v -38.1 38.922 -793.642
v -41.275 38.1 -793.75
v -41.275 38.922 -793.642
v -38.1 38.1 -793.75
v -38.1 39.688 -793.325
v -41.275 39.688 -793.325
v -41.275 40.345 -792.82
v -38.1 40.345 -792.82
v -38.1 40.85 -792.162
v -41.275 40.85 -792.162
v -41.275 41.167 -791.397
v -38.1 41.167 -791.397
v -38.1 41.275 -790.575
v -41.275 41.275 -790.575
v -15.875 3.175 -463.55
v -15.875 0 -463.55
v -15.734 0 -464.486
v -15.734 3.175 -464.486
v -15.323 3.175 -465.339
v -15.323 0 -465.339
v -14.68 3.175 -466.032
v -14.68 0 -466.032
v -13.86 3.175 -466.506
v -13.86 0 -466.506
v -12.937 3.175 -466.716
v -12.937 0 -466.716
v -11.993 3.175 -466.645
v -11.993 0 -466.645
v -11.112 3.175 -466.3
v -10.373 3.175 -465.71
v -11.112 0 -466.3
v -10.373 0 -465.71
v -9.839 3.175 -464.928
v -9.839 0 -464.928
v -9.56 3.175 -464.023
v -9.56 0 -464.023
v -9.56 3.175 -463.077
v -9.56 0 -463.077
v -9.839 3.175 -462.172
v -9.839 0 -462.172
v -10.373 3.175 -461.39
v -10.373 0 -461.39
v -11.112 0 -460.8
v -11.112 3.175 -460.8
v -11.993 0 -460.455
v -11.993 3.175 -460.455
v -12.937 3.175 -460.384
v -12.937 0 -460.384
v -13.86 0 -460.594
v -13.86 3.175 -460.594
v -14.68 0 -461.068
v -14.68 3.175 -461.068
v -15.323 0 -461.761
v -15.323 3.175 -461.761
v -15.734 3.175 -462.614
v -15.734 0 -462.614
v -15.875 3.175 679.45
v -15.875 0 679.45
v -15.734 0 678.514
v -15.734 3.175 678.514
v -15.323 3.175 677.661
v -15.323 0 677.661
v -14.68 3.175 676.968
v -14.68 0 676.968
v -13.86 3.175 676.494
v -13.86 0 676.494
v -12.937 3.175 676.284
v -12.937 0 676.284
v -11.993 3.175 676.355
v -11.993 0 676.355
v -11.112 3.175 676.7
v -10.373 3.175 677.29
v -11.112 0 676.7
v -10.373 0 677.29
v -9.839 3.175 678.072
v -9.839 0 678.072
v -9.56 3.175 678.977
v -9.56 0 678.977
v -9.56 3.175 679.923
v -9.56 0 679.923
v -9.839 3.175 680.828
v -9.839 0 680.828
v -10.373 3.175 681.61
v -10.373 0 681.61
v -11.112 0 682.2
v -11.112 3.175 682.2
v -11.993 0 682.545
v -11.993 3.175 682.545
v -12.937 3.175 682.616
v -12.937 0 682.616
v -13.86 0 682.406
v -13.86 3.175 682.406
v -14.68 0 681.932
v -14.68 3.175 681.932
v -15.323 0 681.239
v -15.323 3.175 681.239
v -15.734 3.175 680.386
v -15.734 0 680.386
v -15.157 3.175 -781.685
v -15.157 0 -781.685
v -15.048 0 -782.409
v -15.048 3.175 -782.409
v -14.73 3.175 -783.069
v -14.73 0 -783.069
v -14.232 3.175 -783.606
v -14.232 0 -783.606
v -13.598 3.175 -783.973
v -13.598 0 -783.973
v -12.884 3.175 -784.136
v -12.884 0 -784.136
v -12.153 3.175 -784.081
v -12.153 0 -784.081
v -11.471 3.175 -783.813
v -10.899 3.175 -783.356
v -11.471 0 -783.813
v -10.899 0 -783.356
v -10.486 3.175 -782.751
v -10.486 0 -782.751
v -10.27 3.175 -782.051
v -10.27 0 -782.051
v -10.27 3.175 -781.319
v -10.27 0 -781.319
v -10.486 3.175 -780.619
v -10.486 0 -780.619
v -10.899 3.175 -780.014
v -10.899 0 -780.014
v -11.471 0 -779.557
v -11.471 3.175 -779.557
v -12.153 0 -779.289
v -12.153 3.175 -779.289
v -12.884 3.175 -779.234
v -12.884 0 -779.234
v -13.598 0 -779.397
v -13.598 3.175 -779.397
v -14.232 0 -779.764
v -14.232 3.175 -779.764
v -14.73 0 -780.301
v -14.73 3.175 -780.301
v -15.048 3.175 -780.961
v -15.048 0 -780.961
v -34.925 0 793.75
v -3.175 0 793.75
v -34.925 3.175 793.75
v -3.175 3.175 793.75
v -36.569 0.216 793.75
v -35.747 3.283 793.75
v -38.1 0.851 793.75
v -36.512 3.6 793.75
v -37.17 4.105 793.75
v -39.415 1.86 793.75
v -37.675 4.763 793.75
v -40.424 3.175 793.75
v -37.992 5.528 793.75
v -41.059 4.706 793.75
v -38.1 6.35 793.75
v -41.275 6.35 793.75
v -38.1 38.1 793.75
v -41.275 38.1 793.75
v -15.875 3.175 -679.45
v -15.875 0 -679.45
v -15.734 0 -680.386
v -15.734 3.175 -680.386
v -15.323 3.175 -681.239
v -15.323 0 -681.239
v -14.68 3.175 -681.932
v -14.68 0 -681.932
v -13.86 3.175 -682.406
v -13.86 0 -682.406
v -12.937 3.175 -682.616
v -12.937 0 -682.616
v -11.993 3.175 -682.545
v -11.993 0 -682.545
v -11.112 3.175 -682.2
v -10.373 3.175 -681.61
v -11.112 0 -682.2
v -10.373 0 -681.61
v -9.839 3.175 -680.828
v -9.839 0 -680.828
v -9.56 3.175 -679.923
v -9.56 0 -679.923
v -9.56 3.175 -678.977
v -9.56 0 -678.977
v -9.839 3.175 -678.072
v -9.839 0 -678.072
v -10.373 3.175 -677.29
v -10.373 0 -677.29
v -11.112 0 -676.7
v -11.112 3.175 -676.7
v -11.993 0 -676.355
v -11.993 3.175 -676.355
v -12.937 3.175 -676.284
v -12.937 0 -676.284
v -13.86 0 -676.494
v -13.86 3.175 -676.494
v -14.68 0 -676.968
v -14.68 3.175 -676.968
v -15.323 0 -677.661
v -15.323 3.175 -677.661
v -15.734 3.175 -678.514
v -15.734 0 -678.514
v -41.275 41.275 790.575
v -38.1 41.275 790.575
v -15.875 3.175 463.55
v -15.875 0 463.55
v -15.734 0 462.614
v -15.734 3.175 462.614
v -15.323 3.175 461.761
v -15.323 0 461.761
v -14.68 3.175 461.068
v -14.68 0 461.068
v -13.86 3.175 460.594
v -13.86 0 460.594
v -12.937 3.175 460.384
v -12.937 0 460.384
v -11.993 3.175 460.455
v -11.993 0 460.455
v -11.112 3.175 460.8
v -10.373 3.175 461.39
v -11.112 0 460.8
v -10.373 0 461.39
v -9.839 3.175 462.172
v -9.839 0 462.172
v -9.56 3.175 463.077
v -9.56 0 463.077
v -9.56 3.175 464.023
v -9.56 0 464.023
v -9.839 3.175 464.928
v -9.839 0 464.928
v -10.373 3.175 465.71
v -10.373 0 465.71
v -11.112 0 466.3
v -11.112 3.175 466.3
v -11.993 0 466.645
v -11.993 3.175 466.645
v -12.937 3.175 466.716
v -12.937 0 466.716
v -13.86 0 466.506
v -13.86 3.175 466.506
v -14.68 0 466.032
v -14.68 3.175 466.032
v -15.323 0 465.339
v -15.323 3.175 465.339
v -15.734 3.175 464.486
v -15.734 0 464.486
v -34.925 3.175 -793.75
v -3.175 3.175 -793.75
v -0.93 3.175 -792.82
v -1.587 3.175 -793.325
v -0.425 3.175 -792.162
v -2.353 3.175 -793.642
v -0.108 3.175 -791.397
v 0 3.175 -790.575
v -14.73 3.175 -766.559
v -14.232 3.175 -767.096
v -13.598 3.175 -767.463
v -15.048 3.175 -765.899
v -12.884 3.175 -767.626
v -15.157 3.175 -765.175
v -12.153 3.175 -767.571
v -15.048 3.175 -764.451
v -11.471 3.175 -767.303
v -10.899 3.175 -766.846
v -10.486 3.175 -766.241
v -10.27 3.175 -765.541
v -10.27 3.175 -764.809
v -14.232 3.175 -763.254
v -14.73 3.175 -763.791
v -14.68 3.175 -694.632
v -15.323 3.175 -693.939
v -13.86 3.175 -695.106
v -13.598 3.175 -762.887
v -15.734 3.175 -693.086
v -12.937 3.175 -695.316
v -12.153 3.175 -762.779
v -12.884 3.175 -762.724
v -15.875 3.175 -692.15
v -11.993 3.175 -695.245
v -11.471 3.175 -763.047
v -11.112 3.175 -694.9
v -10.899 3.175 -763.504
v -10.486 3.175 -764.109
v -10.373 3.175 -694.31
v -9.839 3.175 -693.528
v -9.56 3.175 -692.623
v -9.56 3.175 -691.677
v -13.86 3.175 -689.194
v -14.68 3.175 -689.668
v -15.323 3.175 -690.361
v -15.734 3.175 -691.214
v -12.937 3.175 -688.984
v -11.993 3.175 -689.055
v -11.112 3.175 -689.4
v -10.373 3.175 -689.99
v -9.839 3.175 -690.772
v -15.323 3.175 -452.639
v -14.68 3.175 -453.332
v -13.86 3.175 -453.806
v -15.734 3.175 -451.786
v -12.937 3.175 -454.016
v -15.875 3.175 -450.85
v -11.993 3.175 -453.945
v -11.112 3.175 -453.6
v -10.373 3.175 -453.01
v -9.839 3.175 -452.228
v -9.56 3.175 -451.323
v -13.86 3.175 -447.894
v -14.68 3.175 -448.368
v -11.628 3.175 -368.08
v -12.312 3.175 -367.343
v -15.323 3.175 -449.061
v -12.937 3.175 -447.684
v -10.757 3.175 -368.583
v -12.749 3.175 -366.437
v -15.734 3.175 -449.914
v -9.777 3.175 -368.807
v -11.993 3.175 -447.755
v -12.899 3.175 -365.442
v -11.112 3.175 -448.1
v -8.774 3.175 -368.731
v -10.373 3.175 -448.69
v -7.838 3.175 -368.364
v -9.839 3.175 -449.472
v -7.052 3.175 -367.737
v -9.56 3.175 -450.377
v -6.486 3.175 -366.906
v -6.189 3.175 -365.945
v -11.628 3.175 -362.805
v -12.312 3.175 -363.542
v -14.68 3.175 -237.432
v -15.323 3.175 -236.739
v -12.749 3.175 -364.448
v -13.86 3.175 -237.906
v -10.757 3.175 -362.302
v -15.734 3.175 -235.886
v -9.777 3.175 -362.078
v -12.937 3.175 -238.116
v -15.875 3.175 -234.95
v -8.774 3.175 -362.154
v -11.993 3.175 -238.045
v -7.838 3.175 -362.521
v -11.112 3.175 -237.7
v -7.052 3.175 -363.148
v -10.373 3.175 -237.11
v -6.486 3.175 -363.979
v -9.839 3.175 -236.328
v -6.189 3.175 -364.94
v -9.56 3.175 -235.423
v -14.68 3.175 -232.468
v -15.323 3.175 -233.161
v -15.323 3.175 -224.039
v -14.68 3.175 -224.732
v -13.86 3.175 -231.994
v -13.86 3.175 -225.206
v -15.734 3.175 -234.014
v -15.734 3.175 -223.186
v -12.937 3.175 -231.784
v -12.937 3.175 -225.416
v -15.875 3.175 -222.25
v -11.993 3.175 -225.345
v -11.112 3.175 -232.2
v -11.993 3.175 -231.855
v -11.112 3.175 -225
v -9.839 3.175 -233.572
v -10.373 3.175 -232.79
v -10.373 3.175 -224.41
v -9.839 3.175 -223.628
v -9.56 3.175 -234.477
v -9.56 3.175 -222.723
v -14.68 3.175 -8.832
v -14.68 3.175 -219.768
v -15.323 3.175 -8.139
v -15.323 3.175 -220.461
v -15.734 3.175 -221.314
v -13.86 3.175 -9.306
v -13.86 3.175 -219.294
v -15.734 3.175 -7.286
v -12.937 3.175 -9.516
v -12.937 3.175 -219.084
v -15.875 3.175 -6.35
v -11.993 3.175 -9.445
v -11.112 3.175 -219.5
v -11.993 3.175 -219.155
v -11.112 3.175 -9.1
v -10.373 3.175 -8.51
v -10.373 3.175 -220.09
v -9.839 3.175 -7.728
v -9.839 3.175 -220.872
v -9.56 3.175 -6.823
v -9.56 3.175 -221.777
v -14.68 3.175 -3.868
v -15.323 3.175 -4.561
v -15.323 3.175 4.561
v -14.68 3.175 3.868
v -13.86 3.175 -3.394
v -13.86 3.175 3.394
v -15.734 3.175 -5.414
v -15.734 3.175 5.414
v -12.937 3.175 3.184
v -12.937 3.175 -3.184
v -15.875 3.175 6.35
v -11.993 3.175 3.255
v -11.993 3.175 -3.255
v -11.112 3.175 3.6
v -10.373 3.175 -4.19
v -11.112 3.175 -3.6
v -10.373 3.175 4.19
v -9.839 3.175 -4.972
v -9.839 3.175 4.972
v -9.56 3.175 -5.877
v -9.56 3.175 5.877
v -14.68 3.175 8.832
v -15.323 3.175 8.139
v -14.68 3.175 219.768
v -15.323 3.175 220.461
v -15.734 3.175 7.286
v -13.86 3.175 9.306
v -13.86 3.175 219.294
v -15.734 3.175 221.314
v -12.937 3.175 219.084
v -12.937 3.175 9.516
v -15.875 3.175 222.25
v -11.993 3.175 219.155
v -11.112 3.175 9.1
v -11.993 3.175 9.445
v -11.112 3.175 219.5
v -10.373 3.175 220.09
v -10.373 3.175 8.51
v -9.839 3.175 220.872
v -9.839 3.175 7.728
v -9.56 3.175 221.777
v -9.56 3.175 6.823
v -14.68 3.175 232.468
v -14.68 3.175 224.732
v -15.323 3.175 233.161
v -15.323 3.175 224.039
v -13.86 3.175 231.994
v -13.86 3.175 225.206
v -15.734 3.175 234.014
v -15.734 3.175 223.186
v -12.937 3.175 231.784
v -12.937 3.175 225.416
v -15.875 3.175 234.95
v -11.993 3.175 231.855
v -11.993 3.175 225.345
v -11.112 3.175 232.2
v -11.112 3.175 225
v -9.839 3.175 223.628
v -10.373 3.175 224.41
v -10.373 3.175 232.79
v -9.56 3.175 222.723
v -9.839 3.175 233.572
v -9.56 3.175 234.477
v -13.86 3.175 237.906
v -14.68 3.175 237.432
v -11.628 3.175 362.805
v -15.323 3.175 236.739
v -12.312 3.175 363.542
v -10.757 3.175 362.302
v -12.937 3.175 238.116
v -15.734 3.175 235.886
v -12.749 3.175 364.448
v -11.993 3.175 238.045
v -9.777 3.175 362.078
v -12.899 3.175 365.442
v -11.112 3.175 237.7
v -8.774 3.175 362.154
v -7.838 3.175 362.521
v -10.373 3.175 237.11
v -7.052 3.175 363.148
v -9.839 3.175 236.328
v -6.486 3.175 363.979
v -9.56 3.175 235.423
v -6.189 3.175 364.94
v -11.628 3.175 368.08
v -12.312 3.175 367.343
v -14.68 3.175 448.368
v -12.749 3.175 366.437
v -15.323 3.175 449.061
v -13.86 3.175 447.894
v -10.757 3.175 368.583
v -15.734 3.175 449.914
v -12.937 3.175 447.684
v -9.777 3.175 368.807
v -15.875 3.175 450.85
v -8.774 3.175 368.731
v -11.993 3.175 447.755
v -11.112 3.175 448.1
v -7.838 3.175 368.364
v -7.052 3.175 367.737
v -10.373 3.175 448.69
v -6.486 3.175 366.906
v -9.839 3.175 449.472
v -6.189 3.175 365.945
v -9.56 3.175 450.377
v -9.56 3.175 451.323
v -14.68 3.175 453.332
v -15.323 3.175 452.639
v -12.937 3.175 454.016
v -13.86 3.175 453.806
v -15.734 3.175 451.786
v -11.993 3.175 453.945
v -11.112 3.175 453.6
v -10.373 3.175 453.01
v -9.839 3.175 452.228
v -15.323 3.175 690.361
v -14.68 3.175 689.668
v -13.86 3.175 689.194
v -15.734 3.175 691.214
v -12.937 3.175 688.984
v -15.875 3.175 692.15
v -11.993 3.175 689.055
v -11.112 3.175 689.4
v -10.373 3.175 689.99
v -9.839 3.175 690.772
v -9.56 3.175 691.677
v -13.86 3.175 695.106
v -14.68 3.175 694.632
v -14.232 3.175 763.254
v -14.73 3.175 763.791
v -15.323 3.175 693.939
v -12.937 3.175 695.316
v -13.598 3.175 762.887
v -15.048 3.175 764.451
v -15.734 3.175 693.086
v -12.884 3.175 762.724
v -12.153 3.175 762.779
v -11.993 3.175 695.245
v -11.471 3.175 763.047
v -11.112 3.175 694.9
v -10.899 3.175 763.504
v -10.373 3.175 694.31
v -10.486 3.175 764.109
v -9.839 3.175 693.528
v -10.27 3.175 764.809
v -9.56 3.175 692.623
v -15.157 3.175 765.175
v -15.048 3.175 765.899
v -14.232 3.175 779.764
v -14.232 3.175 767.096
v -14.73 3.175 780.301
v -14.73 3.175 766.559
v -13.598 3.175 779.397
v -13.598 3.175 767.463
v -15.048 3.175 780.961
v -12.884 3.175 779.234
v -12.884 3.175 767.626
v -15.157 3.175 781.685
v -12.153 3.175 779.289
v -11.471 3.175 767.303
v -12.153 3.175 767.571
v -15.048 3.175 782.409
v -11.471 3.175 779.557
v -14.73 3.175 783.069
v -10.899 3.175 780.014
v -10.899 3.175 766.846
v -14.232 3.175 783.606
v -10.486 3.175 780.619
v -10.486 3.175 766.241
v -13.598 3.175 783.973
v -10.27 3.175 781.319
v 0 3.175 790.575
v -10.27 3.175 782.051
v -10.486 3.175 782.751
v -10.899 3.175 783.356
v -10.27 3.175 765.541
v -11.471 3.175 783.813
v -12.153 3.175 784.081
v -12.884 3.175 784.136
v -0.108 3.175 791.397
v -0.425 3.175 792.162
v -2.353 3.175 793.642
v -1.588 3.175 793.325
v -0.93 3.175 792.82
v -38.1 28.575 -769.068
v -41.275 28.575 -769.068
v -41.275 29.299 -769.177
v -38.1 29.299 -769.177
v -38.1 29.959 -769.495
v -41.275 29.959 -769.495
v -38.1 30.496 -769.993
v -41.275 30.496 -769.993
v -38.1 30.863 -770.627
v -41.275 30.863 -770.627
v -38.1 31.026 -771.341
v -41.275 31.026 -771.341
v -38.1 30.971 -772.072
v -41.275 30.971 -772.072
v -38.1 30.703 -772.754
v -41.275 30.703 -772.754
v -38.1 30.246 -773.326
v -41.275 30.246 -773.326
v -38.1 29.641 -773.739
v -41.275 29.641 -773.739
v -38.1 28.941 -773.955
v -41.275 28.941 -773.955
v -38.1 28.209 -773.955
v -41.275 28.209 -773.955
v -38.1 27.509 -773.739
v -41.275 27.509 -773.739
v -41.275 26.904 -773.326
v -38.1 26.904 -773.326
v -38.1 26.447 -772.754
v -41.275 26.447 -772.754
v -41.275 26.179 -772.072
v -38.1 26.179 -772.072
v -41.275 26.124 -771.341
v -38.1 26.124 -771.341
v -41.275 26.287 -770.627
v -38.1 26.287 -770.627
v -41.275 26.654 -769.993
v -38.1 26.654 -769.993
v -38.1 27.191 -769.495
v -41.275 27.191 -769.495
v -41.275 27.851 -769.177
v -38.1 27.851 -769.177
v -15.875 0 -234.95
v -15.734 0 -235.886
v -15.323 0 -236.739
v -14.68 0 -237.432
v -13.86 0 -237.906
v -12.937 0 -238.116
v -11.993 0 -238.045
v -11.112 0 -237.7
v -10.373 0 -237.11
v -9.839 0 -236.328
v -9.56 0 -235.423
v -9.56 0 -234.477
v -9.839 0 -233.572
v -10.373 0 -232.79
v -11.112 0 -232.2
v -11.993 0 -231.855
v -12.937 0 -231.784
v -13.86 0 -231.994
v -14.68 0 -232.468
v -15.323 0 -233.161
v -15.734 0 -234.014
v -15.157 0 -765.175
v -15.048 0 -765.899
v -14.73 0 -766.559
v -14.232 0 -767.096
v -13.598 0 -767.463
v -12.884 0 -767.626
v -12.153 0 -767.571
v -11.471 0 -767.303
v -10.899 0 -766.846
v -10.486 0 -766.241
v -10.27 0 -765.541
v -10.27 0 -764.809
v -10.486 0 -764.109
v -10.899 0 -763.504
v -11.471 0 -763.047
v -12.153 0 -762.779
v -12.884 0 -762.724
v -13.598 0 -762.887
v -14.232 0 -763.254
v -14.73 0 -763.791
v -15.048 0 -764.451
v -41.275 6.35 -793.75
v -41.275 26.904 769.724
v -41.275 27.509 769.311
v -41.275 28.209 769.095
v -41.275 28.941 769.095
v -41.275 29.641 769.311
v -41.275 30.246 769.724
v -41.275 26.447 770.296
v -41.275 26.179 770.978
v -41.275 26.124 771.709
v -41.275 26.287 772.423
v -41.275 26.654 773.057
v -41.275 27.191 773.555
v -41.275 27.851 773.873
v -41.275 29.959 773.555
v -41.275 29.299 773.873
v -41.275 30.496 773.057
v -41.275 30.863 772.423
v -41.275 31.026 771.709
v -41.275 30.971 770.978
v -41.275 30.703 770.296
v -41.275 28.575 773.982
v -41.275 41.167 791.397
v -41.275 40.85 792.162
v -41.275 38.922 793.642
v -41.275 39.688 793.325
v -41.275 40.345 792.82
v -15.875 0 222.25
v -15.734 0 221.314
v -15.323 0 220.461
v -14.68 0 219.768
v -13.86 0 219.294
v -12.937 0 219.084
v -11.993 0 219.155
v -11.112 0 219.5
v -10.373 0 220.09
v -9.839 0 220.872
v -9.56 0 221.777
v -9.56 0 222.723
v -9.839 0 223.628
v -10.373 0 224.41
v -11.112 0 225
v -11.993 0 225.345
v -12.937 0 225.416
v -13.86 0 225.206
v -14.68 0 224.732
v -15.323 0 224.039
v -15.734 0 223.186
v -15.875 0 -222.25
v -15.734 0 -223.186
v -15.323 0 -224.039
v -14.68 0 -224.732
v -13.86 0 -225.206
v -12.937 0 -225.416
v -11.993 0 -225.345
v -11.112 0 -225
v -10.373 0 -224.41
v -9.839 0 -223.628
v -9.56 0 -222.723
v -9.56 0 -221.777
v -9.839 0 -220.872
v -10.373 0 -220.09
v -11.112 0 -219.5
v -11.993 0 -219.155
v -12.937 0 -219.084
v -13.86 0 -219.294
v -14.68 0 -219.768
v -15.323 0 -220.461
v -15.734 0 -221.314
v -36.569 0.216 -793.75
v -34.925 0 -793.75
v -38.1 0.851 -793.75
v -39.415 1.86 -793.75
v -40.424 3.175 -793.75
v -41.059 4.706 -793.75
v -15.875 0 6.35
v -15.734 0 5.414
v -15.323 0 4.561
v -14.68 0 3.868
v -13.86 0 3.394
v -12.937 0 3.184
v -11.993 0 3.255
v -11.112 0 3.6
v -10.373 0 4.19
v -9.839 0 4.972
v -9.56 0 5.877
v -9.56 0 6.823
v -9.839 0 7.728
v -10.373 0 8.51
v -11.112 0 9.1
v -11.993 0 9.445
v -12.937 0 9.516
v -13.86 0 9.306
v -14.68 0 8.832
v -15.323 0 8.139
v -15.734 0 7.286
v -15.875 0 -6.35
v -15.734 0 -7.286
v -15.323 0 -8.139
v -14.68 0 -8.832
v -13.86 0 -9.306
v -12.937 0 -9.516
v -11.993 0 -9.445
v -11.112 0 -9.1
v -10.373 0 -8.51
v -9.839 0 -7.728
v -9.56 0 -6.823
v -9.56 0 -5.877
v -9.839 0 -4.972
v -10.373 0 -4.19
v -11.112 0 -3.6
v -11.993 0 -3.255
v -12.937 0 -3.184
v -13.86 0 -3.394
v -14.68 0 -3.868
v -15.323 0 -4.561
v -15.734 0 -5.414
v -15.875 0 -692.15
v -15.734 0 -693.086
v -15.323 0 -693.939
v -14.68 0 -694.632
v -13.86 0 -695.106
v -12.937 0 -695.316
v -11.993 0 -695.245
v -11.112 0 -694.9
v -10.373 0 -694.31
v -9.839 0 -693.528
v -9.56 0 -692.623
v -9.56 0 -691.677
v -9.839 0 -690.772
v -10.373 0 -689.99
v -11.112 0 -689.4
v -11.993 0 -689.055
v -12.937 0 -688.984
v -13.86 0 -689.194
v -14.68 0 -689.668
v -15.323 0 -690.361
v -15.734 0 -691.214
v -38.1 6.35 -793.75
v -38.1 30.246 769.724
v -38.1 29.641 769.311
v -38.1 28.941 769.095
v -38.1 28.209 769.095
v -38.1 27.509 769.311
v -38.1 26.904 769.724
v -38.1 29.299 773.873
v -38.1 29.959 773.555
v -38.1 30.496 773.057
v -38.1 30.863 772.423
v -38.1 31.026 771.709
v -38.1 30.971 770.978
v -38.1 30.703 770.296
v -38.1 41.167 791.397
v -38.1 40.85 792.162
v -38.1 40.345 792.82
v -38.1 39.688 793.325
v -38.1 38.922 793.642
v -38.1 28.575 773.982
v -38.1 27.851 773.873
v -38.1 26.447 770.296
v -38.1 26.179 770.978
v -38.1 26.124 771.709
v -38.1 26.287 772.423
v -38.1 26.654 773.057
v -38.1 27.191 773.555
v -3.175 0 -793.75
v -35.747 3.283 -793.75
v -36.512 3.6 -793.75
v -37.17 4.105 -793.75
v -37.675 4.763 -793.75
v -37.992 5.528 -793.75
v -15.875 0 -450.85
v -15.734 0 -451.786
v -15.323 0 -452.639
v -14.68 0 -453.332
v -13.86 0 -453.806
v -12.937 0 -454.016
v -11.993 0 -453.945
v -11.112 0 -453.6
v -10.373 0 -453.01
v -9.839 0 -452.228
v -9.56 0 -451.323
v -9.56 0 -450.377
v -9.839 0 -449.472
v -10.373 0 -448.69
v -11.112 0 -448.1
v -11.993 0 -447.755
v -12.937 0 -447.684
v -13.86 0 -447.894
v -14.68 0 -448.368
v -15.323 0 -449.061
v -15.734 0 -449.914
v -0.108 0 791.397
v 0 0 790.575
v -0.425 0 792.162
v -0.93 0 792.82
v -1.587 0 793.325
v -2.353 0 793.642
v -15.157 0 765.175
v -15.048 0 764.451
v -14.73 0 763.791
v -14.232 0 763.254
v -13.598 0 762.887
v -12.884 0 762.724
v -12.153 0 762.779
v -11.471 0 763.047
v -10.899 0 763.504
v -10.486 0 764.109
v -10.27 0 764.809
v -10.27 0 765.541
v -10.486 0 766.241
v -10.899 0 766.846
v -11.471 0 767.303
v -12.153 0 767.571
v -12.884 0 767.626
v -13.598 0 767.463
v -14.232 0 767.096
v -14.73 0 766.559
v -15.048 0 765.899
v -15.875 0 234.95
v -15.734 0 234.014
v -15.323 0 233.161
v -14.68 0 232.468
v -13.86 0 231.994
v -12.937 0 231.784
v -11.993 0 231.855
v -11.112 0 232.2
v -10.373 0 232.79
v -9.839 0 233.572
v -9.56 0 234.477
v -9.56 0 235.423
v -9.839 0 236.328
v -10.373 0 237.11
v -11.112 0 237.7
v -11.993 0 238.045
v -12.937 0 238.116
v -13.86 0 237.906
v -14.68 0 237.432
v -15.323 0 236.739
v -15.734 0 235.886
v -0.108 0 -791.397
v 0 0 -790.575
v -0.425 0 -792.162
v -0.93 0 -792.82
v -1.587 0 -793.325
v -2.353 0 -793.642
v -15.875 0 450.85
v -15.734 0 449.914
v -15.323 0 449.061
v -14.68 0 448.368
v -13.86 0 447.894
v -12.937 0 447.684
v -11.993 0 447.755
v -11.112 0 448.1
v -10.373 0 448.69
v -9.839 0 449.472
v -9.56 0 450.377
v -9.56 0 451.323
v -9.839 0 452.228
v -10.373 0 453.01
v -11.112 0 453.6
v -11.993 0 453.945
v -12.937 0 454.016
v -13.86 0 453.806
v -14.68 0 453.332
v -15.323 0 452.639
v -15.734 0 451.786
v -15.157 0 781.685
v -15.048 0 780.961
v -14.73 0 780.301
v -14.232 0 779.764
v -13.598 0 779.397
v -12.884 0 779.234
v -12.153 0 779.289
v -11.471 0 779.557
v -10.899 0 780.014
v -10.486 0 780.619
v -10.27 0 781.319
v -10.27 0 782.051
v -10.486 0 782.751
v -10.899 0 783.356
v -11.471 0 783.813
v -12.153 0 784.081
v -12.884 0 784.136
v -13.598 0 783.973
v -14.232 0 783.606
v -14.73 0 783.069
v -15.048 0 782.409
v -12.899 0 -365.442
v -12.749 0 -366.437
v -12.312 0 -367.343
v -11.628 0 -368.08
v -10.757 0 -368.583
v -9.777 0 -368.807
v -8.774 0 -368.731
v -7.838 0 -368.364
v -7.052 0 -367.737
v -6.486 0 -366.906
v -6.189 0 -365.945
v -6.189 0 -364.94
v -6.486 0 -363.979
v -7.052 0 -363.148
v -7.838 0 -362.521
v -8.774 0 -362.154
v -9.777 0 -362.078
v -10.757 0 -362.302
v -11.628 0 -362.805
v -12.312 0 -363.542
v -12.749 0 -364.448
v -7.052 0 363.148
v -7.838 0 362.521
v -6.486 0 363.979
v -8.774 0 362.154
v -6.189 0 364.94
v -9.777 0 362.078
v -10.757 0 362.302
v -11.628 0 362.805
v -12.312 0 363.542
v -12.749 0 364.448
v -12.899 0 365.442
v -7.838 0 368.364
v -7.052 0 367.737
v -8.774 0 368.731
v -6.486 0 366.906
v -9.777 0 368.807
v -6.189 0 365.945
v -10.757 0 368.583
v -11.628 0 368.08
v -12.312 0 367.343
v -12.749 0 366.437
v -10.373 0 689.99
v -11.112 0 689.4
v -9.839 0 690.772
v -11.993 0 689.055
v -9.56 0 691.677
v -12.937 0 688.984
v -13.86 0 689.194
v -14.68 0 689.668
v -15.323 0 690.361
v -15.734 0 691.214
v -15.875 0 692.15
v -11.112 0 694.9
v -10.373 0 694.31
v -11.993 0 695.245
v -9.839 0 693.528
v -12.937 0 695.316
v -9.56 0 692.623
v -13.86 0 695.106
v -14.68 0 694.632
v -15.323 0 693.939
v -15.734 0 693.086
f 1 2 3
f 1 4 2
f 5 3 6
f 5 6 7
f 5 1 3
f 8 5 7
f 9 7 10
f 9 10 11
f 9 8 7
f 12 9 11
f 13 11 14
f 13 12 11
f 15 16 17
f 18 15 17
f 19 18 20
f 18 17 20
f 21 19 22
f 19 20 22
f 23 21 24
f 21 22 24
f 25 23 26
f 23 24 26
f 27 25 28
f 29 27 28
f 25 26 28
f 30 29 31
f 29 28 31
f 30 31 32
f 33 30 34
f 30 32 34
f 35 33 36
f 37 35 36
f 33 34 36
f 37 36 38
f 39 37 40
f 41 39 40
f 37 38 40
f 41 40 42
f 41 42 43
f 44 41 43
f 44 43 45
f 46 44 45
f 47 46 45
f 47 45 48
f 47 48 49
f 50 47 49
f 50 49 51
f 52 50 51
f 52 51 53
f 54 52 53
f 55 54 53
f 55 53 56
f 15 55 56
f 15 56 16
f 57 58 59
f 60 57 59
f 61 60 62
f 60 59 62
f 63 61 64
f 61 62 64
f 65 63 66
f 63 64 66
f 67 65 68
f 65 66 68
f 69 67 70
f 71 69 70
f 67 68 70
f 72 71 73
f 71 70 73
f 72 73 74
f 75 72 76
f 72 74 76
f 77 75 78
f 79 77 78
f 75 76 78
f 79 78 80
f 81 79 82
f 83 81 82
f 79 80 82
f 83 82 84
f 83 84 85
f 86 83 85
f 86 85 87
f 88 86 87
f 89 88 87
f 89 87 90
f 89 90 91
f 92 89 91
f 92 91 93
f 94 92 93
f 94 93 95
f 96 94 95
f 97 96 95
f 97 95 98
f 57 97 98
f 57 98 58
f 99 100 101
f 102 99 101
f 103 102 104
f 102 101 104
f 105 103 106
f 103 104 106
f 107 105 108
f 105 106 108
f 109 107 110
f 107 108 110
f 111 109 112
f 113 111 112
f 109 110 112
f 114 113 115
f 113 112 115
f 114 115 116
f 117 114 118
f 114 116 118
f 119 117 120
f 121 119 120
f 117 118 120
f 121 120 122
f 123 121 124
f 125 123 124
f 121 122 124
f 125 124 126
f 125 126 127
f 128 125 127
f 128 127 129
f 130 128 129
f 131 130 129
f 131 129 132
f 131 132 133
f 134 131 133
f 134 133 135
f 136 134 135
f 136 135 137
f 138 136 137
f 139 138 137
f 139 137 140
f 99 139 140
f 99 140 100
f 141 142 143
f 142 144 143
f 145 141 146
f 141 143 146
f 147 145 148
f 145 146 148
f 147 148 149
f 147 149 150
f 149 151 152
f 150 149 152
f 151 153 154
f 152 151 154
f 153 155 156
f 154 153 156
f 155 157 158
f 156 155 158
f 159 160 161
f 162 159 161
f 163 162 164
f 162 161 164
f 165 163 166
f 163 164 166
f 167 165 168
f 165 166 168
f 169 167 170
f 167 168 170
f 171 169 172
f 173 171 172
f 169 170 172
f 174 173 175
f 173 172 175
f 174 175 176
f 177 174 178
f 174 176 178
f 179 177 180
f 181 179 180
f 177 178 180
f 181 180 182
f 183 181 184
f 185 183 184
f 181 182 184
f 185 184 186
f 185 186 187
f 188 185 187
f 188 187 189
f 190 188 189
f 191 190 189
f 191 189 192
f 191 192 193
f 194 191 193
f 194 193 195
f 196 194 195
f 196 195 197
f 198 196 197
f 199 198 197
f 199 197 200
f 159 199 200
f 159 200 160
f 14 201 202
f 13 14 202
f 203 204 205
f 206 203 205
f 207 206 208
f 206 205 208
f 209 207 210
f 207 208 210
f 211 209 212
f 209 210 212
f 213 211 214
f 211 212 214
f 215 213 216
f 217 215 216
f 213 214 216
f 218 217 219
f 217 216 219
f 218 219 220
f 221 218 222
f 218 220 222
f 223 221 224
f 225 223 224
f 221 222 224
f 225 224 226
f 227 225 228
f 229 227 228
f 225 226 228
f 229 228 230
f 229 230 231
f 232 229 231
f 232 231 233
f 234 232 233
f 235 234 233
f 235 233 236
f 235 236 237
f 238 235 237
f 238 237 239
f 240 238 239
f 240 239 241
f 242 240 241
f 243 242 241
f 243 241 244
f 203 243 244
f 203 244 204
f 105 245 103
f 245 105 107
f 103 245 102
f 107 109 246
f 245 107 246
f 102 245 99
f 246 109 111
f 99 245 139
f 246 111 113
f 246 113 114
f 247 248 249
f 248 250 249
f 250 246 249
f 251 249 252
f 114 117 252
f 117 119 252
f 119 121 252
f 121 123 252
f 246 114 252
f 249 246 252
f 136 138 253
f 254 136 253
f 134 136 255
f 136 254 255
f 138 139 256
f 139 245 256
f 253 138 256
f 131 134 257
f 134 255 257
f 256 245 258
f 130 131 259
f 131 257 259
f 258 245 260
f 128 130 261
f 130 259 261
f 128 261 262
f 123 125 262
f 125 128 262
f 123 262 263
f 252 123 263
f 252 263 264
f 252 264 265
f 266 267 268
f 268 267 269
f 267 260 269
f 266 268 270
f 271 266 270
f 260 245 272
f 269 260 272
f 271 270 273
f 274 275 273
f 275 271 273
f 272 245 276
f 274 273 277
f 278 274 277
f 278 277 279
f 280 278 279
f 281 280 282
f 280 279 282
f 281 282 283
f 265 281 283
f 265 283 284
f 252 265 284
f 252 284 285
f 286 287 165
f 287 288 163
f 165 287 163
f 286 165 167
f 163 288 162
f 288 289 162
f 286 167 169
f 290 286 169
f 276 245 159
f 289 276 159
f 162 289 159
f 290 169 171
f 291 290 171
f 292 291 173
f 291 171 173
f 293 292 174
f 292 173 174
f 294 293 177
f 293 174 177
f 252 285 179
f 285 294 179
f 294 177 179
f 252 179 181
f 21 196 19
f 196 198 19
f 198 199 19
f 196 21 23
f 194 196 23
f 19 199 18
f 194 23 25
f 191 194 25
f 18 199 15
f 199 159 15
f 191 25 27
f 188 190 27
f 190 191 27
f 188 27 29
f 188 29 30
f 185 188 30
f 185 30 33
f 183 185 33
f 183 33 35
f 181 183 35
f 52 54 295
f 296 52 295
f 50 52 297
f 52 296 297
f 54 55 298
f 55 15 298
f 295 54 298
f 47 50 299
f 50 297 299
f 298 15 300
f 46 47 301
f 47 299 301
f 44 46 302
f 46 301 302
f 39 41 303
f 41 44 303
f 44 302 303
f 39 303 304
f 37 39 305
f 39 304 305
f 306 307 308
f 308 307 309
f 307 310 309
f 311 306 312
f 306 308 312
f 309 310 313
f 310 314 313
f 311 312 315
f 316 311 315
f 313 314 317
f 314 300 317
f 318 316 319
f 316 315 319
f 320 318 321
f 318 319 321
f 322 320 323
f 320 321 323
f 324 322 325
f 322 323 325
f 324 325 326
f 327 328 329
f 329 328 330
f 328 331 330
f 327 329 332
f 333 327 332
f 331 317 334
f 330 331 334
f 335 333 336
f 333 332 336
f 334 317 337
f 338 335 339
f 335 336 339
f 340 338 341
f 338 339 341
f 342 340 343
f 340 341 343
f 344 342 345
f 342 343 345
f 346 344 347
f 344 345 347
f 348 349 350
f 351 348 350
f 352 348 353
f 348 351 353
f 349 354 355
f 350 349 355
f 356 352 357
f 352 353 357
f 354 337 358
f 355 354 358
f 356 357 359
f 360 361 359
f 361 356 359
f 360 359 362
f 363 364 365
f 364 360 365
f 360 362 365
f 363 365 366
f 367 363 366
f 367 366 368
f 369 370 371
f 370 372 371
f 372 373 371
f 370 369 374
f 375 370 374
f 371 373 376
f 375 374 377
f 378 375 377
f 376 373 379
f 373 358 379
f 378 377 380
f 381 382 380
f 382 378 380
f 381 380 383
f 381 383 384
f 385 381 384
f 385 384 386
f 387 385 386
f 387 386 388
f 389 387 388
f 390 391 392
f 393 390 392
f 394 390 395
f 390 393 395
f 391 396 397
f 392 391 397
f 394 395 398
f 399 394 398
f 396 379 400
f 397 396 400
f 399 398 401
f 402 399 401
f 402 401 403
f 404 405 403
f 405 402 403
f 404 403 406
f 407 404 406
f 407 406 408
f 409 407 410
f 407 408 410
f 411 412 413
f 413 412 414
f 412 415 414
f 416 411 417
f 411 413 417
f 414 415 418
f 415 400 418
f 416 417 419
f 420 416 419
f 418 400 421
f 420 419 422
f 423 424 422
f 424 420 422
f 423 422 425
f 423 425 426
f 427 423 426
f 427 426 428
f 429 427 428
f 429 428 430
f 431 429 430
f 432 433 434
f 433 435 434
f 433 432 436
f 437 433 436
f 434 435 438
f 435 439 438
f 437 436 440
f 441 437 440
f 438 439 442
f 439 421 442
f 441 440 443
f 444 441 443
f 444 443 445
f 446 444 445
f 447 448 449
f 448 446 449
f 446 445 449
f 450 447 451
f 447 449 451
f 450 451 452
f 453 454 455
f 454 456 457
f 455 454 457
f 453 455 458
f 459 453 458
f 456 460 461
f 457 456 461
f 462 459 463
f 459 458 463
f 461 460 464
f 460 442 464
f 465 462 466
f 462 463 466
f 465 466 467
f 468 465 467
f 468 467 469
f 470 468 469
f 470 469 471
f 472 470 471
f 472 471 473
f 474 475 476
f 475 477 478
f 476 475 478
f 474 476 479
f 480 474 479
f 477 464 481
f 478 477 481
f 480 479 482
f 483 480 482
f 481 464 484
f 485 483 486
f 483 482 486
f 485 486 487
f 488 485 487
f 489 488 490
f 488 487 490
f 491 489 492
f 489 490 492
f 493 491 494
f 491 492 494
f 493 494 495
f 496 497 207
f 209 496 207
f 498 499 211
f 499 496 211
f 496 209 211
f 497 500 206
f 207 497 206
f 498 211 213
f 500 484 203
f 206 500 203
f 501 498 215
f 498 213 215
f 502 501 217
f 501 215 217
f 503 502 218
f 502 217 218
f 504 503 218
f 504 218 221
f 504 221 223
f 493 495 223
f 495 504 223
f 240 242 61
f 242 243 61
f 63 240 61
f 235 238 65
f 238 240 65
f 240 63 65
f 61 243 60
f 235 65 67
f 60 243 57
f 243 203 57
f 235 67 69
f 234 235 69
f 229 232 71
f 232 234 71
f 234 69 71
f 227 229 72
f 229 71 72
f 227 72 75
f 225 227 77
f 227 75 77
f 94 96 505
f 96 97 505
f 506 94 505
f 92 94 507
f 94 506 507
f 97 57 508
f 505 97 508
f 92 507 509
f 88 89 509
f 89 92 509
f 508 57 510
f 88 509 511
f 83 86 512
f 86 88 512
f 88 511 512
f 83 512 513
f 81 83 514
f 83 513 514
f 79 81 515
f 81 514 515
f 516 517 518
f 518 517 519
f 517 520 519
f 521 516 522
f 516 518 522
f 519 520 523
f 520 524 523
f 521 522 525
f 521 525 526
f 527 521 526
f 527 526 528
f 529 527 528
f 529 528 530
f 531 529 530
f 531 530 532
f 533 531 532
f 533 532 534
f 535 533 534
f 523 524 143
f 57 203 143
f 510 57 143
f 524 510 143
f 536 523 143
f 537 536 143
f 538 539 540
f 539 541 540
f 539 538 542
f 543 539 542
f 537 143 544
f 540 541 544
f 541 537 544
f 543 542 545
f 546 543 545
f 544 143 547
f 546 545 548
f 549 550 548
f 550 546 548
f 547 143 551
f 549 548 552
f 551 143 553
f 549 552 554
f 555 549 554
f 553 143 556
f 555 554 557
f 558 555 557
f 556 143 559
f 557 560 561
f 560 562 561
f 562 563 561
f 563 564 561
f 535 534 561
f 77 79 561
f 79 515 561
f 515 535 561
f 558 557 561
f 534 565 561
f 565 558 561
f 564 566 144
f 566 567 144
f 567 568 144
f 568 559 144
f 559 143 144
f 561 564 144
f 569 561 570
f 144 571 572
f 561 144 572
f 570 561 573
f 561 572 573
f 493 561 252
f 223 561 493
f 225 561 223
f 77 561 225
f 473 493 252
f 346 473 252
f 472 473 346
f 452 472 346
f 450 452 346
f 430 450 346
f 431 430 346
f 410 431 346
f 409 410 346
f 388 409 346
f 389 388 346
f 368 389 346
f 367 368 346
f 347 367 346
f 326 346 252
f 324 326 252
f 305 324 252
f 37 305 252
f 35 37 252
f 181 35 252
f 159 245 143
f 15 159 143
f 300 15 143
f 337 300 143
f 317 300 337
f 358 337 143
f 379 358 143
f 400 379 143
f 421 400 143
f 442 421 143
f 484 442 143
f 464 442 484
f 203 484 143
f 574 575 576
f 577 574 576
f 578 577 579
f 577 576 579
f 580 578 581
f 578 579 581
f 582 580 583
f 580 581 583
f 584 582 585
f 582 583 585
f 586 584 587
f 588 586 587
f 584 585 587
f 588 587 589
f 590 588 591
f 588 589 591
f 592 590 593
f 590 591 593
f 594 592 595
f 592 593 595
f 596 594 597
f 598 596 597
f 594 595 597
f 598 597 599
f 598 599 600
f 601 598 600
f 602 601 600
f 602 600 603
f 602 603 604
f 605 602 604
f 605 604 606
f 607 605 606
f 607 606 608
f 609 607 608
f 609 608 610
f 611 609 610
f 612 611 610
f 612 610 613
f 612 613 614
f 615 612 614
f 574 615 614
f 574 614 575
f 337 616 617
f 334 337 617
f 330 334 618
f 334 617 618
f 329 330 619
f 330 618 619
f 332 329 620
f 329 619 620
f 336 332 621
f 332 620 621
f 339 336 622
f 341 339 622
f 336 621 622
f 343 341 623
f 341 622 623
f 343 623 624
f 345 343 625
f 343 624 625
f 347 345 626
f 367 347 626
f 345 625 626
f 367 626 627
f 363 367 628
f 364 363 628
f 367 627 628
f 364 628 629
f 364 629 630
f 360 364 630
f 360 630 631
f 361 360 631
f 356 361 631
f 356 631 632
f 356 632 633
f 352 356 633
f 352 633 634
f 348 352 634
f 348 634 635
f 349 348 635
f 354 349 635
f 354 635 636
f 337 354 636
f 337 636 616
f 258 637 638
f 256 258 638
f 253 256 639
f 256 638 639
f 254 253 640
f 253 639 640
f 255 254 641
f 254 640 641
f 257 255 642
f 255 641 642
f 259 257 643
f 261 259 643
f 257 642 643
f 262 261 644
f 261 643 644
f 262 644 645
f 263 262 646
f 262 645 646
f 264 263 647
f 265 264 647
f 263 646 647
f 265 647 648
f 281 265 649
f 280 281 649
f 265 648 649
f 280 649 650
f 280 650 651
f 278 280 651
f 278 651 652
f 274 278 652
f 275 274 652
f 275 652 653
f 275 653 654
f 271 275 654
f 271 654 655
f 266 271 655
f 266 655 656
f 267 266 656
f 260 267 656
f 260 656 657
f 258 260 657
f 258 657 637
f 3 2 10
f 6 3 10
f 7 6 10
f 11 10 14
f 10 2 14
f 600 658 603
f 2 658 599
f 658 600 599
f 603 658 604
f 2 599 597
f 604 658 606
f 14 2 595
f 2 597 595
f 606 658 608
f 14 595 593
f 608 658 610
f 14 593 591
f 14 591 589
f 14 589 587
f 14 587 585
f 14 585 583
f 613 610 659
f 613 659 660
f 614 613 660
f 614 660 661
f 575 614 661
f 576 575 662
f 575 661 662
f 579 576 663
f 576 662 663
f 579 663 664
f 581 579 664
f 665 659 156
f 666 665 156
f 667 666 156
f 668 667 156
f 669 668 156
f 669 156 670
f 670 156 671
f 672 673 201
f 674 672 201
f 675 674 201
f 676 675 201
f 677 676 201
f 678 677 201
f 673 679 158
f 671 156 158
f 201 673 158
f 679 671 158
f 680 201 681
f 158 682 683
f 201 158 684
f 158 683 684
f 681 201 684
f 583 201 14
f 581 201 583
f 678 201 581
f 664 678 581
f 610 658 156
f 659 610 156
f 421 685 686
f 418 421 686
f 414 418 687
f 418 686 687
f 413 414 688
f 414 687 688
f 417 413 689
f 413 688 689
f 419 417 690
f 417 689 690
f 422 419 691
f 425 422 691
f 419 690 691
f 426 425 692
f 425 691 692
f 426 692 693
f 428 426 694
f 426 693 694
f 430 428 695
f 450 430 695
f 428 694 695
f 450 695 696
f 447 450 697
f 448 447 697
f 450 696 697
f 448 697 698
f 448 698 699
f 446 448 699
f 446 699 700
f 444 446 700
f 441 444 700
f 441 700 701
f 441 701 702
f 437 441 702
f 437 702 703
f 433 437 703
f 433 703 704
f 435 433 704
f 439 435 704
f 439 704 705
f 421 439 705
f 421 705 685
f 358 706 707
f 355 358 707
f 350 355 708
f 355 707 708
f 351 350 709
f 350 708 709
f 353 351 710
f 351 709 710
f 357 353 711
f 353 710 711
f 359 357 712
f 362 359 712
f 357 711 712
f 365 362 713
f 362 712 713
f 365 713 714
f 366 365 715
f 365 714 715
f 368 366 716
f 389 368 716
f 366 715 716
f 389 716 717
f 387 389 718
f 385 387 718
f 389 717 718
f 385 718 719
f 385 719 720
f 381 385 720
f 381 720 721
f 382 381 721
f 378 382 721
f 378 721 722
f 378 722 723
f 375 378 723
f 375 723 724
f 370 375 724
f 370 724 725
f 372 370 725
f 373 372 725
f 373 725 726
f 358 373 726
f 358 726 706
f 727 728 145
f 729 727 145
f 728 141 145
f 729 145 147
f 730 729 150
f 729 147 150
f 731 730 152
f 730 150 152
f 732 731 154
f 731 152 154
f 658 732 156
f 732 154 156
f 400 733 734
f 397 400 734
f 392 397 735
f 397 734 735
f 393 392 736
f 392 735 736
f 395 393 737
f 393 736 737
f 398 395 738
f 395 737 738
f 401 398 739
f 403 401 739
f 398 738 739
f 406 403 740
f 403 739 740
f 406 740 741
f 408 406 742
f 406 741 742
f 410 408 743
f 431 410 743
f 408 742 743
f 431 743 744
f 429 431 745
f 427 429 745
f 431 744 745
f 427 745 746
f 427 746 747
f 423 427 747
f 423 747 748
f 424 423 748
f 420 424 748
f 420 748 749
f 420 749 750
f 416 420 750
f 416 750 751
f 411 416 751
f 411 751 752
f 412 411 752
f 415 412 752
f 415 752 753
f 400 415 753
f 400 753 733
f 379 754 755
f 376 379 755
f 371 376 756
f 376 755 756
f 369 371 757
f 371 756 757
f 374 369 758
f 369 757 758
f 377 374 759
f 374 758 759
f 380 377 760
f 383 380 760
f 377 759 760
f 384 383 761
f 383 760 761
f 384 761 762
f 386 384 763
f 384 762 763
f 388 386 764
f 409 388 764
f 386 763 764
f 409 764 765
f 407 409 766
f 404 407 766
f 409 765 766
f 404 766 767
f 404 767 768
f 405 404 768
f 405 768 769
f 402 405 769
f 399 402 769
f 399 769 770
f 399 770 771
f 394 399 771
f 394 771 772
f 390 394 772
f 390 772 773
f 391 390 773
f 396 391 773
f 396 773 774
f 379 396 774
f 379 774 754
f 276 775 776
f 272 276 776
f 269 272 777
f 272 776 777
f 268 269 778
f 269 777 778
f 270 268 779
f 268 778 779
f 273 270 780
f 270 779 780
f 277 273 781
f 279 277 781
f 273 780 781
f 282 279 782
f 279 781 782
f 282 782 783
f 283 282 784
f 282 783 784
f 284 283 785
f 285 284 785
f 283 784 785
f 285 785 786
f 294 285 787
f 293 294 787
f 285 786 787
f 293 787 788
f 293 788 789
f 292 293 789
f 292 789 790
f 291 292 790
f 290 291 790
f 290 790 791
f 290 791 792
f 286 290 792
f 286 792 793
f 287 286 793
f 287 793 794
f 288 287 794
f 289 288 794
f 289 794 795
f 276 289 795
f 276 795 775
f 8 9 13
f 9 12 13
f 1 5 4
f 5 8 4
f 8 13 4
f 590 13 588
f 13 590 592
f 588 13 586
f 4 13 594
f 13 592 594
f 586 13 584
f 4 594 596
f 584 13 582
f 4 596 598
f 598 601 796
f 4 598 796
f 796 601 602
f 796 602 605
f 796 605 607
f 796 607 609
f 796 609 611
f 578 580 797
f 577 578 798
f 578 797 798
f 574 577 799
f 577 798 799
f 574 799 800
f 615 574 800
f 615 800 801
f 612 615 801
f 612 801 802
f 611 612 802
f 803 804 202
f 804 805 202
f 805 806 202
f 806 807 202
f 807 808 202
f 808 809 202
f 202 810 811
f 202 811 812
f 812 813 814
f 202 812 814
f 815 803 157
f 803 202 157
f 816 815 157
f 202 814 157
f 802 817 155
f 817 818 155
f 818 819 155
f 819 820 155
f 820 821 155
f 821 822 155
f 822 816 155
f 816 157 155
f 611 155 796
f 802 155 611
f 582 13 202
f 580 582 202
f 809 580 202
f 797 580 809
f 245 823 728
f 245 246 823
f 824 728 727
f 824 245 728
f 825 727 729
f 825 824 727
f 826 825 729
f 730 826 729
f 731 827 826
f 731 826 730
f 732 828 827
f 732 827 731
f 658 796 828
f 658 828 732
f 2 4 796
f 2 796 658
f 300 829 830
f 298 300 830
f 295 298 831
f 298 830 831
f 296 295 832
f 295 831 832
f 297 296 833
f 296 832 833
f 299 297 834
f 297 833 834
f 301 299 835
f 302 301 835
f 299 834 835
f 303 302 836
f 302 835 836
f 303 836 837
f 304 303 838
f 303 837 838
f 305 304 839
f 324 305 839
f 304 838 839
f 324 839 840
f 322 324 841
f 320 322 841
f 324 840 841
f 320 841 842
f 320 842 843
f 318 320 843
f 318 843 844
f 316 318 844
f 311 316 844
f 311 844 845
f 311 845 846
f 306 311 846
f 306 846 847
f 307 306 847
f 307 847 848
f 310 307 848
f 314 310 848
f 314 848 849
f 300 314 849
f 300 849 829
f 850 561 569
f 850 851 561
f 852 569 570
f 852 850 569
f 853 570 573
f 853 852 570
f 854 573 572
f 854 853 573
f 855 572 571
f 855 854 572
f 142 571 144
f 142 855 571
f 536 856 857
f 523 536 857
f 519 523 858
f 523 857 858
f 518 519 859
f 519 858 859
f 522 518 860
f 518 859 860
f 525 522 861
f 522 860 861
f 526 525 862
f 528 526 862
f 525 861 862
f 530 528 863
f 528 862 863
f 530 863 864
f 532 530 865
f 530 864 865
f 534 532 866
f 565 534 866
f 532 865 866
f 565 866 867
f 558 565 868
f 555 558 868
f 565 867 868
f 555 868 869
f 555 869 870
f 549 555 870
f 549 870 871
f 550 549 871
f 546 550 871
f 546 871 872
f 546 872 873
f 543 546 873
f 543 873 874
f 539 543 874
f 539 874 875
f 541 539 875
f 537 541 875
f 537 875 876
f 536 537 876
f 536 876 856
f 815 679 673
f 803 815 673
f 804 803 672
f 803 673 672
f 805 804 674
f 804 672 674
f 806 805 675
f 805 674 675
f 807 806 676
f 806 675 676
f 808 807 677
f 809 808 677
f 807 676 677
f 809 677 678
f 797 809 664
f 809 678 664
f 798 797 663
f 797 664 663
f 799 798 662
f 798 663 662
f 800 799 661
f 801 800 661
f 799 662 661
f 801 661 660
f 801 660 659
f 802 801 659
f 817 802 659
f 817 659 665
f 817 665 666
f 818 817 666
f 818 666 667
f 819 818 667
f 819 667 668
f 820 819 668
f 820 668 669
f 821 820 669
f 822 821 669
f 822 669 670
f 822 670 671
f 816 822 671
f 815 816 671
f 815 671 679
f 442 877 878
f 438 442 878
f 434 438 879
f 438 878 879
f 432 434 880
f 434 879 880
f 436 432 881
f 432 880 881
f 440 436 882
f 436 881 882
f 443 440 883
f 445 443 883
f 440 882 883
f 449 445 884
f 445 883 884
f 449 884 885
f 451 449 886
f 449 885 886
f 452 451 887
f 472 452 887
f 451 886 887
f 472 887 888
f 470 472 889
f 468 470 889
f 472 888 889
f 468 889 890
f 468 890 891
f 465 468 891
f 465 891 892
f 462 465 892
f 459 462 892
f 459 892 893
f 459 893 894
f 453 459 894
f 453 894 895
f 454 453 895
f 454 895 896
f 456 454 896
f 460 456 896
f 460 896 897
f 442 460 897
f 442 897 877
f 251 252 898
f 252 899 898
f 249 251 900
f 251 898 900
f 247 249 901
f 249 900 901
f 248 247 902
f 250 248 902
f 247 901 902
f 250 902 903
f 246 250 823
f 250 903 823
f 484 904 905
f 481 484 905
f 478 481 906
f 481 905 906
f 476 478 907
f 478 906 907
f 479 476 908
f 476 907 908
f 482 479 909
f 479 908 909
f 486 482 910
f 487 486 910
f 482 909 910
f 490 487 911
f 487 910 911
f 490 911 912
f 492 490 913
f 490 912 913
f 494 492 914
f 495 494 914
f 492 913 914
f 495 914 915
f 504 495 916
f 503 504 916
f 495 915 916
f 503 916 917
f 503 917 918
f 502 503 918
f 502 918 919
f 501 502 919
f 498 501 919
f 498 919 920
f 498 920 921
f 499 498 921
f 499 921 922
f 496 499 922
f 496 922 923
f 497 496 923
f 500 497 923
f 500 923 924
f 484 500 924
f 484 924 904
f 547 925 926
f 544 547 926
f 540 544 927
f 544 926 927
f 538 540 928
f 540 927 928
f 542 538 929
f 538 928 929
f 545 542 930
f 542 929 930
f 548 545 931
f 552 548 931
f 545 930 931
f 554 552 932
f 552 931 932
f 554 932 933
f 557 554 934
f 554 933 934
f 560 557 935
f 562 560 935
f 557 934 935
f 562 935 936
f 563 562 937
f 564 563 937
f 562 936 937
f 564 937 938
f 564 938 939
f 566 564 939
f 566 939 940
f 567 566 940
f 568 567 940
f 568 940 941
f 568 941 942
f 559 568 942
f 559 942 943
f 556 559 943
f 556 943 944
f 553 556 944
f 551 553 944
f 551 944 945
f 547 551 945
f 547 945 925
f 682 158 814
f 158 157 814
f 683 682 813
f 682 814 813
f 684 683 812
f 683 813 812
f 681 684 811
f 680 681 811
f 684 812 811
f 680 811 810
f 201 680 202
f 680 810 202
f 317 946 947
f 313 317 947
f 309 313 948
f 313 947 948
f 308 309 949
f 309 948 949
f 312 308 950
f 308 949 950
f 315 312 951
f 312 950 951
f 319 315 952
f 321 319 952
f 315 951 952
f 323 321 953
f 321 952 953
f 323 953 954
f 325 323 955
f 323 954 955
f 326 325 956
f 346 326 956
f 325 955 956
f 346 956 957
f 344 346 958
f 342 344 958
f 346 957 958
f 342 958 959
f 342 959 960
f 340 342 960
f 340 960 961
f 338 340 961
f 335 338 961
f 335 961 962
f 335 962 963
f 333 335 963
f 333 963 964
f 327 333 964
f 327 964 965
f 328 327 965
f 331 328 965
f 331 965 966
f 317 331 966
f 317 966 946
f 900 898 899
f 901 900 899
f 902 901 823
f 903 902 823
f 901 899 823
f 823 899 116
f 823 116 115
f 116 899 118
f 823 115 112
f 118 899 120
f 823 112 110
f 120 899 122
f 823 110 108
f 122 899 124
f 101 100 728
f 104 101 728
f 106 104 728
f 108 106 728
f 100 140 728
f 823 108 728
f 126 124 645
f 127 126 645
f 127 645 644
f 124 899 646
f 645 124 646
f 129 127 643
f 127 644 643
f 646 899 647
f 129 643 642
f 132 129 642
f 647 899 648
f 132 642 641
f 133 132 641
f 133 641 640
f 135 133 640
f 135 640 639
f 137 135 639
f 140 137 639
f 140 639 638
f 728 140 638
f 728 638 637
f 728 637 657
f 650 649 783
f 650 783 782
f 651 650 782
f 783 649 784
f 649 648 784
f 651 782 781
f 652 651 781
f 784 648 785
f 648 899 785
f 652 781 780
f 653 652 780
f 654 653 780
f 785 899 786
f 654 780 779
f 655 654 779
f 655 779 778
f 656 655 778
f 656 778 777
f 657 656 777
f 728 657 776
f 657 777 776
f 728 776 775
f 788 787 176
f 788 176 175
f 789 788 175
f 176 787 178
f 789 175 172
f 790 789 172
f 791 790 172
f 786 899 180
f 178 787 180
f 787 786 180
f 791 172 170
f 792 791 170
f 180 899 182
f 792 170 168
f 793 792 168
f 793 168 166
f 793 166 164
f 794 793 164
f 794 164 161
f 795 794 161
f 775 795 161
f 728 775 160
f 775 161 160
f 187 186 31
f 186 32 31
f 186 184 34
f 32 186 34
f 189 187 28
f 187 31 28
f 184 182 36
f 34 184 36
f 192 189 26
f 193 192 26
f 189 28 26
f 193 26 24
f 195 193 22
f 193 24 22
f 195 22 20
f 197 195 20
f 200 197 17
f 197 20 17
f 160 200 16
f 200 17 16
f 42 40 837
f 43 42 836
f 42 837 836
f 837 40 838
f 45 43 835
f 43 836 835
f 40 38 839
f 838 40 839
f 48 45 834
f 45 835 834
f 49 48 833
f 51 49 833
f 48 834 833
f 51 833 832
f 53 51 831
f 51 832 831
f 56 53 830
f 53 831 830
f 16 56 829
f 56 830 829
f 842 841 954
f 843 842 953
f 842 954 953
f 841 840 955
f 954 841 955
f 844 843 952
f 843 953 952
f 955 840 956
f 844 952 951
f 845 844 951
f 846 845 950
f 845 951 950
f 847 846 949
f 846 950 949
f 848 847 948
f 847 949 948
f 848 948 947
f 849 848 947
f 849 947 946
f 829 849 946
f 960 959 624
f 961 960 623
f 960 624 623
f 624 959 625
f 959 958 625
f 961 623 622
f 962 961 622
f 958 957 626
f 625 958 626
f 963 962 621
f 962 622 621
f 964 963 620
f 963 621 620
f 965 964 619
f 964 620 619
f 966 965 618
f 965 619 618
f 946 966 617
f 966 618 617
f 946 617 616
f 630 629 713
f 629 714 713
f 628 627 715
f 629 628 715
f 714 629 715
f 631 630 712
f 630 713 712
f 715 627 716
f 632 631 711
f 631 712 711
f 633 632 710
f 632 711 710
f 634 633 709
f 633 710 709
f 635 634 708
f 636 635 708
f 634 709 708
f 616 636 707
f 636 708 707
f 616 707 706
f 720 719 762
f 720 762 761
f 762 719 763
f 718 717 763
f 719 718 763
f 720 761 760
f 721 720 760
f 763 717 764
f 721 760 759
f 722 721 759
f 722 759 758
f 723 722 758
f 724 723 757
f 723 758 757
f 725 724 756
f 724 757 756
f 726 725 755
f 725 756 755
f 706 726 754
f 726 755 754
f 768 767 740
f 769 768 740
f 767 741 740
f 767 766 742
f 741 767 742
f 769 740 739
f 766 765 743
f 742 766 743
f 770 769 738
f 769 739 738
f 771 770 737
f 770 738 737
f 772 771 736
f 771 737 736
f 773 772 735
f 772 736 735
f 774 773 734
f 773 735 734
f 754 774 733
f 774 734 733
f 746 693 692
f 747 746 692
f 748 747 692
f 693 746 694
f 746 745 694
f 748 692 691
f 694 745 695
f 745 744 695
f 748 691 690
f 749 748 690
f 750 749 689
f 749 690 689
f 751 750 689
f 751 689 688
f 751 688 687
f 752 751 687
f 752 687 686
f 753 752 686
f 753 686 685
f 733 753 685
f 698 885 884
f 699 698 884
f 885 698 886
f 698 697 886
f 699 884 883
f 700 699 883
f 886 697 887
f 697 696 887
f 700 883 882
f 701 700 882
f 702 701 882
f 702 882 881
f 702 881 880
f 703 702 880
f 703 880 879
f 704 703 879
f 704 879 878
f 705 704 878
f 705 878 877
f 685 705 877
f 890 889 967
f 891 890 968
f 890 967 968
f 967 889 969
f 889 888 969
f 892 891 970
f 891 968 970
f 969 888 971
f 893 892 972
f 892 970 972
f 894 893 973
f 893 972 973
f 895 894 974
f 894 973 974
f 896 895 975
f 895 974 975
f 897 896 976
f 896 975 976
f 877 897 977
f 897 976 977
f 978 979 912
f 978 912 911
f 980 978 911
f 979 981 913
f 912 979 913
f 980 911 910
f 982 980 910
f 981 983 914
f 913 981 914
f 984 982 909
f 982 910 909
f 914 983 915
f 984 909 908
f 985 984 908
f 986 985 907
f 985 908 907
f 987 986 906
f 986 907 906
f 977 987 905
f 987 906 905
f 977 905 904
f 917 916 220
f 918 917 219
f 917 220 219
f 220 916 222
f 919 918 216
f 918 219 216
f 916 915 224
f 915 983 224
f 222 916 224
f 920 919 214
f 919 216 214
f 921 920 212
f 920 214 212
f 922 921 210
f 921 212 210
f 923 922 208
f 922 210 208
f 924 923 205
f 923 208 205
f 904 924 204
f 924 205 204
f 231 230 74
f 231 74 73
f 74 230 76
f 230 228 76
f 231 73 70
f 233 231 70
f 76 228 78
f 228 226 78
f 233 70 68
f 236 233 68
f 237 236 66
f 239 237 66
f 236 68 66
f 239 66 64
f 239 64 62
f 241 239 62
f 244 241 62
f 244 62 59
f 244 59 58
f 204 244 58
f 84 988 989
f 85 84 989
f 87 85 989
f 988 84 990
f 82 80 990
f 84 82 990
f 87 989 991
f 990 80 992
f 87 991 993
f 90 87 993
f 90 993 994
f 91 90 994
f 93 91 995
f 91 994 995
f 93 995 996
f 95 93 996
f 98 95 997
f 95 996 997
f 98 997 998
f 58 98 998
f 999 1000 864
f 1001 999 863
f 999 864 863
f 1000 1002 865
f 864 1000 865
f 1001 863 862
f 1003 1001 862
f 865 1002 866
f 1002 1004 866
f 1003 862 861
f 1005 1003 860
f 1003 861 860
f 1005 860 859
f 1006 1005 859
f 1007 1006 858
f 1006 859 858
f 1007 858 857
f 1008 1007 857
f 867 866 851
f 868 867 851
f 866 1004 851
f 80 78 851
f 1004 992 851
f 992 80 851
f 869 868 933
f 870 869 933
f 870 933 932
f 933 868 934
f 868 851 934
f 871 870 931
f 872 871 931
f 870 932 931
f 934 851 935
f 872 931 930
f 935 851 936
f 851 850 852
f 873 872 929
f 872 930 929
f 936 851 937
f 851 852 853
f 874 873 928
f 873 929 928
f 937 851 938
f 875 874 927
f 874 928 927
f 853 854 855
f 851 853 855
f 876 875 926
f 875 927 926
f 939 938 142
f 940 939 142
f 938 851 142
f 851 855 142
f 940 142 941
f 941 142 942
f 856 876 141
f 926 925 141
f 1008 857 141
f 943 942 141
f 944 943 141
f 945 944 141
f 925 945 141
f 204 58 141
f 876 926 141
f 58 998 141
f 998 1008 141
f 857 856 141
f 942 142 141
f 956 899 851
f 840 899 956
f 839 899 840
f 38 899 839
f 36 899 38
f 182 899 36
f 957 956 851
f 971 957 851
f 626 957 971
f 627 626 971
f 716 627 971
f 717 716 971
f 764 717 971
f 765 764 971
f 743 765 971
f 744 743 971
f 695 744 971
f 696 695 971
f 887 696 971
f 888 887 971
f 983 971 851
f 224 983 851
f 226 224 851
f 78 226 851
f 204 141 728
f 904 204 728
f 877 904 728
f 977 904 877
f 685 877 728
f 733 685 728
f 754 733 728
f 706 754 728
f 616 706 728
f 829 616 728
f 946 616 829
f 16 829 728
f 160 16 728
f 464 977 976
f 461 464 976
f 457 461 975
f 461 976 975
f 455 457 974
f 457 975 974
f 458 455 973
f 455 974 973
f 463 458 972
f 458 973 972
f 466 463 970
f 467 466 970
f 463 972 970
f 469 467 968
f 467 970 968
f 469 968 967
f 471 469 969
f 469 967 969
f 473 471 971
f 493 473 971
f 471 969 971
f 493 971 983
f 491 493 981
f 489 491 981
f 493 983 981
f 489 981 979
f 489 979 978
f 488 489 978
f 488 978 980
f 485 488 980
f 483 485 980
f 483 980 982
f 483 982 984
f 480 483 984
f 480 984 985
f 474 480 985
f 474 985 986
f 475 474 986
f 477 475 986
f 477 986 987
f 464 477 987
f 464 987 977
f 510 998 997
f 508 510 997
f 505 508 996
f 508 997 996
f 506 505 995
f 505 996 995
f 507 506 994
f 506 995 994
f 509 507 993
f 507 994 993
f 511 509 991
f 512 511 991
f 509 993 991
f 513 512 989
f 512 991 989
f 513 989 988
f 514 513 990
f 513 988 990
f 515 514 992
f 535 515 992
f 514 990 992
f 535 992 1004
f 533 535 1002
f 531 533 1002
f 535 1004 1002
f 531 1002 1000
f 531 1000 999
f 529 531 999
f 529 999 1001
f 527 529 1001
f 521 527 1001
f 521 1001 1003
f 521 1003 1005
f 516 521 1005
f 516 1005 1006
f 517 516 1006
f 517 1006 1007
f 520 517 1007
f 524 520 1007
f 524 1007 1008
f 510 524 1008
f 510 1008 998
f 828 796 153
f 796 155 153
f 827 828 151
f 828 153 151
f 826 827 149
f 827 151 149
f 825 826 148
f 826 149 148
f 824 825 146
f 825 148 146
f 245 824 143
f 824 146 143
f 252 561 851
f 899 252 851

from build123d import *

# Parameters (mm, degrees)
BASE_FLANGE1_DEPTH               = 793.75
E_0_25_DIAMETER_HOLE1_D          = 6.35
F_10_0_1935_DIAMETER_HOLE1_D     = 4.9149
FILLET1_R                        = 3.175
F_17_64_0_26563_DIAMETER_HOLE2_D = 6.747002
F_10_0_1935_DIAMETER_HOLE2_D     = 4.9149


# Sheet-metal steps are written as plain solids
with BuildPart() as part:
    # Sketch1 → Base-Flange1 (new, symmetric)
    with BuildSketch(Plane.XY):
        with BuildLine():
            Line((0, 0), (-34.925, 0))
            ThreePointArc((-34.925, 0), (-39.415128061, 1.859871939), (-41.275, 6.35))
            Line((-41.275, 6.35), (-41.275, 41.275))
            Line((-41.275, 41.275), (-38.1, 41.275))
            Line((-38.1, 41.275), (-38.1, 6.35))
            ThreePointArc((-38.1, 6.35), (-37.17006403, 4.10493597), (-34.925, 3.175))
            Line((-34.925, 3.175), (0, 3.175))
            Line((0, 3.175), (0, 0))
        make_face()
    extrude(amount=BASE_FLANGE1_DEPTH, both=True)

    # E (0.25) Diameter Hole1 (through all)
    with Locations(Plane(origin=(0, 3.175, 0), x_dir=(1, 0, 0), z_dir=(0, 1, 0))):
        with Locations((-12.7, 6.35), (-12.7, -6.35), (-12.7, 234.95), (-12.7, 222.25), (-12.7, 463.55), (-12.7, 450.85), (-12.7, 692.15), (-12.7, 679.45), (-12.7, -222.25), (-12.7, -234.95), (-12.7, -450.85), (-12.7, -463.55), (-12.7, -679.45), (-12.7, -692.15)):
            Hole(E_0_25_DIAMETER_HOLE1_D / 2)

    # #10 (0.1935) Diameter Hole1 (through all)
    with Locations(Plane(origin=(0, 3.175, 0), x_dir=(1, 0, 0), z_dir=(0, 1, 0))):
        with Locations((-12.7, -765.175), (-12.7, -781.685), (-12.7, 781.685), (-12.7, 765.175)):
            Hole(F_10_0_1935_DIAMETER_HOLE1_D / 2)

    # Fillet1
    fillet1_edges = [part.edges().sort_by_distance(p)[0] for p in [
        (0, 1.5875, 793.75),
        (0, 1.5875, -793.75),
        (-39.6875, 41.275, 793.75),
        (-39.6875, 41.275, -793.75),
    ]]
    fillet(fillet1_edges, radius=FILLET1_R)

    # 17/64 (0.26563) Diameter Hole2 (through all)
    with Locations(Plane(origin=(0, 3.175, 0), x_dir=(1, 0, 0), z_dir=(0, 1, 0))):
        with Locations((-9.525, 365.4425), (-9.525, -365.4425)):
            Hole(F_17_64_0_26563_DIAMETER_HOLE2_D / 2)

    # #10 (0.1935) Diameter Hole2 (through all)
    with Locations(Plane(origin=(-38.1, 0, 0), x_dir=(0, 0, -1), z_dir=(1, 0, 0))):
        with Locations((-771.525, 28.575), (771.525, 28.575)):
            Hole(F_10_0_1935_DIAMETER_HOLE2_D / 2)


solid = part.part
